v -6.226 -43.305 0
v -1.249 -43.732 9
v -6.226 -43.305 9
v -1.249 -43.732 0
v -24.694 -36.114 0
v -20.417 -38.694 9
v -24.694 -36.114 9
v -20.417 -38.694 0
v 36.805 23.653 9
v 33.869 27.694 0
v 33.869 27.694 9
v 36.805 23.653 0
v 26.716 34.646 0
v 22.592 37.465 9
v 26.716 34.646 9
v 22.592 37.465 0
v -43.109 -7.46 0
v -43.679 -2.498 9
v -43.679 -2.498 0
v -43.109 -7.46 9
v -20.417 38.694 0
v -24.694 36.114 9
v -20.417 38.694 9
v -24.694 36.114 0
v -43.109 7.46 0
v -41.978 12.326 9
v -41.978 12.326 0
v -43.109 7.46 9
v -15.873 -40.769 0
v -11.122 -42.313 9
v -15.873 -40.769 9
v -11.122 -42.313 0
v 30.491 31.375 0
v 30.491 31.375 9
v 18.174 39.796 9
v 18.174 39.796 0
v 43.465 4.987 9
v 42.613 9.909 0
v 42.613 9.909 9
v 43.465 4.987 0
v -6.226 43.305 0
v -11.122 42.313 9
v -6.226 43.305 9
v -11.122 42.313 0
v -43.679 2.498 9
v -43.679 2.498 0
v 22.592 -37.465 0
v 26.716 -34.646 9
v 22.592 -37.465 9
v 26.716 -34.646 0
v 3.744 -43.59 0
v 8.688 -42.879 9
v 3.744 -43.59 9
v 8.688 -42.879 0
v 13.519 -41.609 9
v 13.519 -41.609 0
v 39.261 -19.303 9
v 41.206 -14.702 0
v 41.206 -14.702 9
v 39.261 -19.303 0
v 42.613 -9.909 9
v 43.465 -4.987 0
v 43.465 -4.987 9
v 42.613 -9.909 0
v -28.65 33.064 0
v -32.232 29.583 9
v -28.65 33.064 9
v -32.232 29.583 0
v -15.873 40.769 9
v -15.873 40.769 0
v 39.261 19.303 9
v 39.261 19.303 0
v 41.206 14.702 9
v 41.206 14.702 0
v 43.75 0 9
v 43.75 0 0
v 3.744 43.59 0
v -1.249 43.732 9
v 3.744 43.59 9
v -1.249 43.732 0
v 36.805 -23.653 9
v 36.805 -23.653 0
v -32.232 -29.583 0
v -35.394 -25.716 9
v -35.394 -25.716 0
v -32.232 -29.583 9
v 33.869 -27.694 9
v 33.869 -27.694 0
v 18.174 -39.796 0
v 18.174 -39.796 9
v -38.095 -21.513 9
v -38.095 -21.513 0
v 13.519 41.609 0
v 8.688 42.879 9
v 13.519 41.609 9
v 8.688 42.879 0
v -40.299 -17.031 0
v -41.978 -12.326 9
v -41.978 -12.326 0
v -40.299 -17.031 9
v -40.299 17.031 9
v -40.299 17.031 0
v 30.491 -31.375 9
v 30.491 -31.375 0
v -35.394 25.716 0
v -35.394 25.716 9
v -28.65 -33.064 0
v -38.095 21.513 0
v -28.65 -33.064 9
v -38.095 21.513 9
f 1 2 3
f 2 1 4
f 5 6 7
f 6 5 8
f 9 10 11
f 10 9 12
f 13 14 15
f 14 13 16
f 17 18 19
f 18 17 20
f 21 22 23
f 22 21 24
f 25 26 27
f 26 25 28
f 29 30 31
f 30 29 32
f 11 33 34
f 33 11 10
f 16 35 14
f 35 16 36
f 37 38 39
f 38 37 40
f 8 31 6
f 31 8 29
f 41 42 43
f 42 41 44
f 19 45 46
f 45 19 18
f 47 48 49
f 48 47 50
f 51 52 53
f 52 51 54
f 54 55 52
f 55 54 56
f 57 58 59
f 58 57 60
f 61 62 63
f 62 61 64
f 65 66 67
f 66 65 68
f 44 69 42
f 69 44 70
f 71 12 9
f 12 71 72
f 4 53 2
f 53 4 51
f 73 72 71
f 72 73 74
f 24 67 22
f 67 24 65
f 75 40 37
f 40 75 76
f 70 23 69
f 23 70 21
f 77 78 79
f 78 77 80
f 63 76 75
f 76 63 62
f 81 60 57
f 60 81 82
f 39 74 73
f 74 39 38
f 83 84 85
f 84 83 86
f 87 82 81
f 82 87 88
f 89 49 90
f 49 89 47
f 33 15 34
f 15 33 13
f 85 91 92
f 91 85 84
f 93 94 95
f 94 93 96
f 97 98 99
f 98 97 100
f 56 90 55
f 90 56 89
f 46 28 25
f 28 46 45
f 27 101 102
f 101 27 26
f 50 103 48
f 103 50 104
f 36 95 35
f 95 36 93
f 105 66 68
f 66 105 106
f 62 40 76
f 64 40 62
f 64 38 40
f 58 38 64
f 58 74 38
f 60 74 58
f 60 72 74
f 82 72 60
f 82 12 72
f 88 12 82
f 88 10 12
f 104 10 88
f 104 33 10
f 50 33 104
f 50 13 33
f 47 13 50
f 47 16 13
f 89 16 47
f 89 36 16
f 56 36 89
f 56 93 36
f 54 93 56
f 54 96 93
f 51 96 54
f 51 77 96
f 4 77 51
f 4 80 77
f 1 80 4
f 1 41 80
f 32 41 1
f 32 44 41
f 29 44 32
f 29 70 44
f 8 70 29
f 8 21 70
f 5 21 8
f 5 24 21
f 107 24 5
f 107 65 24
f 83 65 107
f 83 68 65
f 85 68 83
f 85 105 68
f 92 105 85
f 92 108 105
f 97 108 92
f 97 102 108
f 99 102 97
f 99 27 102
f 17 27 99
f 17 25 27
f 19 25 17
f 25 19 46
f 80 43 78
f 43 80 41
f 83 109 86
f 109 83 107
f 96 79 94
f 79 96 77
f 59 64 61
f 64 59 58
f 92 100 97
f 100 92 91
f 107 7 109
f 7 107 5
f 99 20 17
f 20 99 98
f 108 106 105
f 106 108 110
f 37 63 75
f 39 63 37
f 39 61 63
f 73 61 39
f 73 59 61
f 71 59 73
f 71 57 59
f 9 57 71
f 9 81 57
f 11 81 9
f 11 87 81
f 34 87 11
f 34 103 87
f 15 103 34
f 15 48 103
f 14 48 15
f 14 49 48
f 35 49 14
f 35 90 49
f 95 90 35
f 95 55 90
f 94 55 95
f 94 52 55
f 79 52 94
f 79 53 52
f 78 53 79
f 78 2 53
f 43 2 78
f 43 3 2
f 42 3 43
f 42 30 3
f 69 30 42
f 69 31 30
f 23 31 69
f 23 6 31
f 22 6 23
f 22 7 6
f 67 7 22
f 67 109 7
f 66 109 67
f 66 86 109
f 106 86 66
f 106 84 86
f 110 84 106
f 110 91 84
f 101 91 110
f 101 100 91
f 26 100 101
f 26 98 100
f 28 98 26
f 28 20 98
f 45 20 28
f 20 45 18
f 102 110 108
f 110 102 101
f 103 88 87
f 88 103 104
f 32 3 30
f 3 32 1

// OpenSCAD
scale([2.5,2.5,3]) {
  difference(){
    cylinder(h=3, r=17.5, $fa=1);
    translate([-8.25,-13,0]) {
      scale([10,10,10]) {
        linear_extrude(height = 1)
          import_dxf("/Users/jyurek/Documents/3D/Objects/Ralph/ralph.dxf");
      }
    }
  }
  cylinder(h=0.25,r=17.5,$fa=1);
}
